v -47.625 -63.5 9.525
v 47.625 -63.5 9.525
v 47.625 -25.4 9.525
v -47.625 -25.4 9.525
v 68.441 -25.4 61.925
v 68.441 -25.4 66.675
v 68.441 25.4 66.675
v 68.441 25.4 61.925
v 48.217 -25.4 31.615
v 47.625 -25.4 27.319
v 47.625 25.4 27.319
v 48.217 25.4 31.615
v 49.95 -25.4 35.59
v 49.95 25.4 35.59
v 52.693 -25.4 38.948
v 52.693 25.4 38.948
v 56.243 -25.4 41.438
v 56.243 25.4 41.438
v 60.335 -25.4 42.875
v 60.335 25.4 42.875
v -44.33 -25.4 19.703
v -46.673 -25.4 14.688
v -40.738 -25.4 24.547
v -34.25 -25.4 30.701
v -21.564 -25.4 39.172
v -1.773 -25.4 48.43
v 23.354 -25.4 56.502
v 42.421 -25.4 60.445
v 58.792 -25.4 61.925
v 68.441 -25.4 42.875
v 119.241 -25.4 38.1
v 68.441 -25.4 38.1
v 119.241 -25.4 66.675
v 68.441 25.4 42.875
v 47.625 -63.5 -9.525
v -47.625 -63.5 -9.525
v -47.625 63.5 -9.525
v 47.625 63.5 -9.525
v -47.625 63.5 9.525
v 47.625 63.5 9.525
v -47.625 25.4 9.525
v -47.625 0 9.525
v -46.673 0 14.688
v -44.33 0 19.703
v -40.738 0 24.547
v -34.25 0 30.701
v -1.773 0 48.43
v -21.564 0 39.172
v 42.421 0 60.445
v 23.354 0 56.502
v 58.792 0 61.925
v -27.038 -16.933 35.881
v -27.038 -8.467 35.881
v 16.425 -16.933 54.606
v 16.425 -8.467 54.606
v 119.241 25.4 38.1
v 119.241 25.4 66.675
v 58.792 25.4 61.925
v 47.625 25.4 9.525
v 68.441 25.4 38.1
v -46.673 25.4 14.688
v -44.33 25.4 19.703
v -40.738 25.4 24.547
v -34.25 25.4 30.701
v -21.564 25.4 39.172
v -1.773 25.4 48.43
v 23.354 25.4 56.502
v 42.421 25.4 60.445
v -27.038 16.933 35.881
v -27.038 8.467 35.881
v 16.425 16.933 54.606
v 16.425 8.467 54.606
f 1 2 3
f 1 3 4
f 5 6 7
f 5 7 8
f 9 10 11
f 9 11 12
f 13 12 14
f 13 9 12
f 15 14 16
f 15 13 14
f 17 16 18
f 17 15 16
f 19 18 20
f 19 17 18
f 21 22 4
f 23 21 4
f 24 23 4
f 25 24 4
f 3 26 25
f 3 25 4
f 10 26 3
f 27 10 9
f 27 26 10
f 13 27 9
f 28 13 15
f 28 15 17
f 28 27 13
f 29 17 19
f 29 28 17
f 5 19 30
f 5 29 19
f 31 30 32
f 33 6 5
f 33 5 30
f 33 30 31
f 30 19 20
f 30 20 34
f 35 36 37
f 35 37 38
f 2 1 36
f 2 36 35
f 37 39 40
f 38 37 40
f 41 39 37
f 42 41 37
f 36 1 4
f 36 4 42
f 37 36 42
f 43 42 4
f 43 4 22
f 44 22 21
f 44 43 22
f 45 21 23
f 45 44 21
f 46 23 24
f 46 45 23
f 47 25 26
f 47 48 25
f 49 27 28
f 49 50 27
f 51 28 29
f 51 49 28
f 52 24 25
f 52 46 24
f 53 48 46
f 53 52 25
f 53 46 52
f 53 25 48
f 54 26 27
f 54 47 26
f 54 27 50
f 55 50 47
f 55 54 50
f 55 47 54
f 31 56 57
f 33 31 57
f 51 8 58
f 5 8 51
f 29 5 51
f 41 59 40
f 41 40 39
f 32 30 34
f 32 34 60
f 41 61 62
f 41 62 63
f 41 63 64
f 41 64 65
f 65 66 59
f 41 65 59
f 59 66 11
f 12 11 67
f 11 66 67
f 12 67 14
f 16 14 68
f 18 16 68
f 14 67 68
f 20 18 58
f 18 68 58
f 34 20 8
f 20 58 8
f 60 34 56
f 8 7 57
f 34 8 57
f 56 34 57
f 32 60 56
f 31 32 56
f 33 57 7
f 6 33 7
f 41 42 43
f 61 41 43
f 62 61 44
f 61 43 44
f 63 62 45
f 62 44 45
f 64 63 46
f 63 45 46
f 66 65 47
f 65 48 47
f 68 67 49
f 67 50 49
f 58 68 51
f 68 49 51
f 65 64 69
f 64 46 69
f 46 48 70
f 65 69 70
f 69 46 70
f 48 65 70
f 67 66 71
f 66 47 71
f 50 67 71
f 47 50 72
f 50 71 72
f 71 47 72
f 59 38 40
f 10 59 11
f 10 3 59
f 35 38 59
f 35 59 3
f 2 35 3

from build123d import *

# Parameters (mm, degrees)
F1_DEPTH = 63.5
F2_DEPTH = 25.4


with BuildPart() as f1:
    # F0 (on Front) → F1 (new body, symmetric)
    with BuildSketch(Plane.XZ):
        Polygon((-47.625, 9.525), (-47.625, -9.525), (47.625, -9.525), (47.625, 9.525), (28.575, 9.525), align=None)
    extrude(amount=F1_DEPTH, both=True)

    # F0 (on Front) → F2 (join, symmetric)
    with BuildSketch(Plane.XZ):
        Polygon((-47.625, 9.525), (-47.625, -9.525), (47.625, -9.525), (47.625, 9.525), (28.575, 9.525), align=None)
        with BuildLine():
            add(Edge.make_bspline(
                [(-47.625, 9.525), (-46.467692, 38.43854), (24.964292, 61.567295), (58.792322, 61.9252)],
                knots=[0, 0, 0, 0, 118.618833, 118.618833, 118.618833, 118.618833], degree=3))
            Line((-47.625, 9.525), (28.575, 9.525))
            Line((28.575, 9.525), (28.575, 27.318938))
            ThreePointArc((28.575, 27.318938), (37.19248, 50.290006), (58.792322, 61.9252))
        make_face()
        with BuildLine():
            Line((28.575, 9.525), (47.625, 9.525))
            Line((47.625, 9.525), (47.625, 27.318938))
            ThreePointArc((47.625, 27.318938), (51.20645, 37.363053), (60.334826, 42.8752))
            Line((60.334826, 42.8752), (68.441236, 42.8752))
            Line((68.441236, 42.8752), (68.441236, 61.9252))
            Line((68.441236, 61.9252), (58.792322, 61.9252))
            ThreePointArc((58.792322, 61.9252), (37.19248, 50.290006), (28.575, 27.318938))
            Line((28.575, 27.318938), (28.575, 9.525))
        make_face()
        Polygon((68.441236, 66.675), (68.441236, 61.9252), (68.441236, 42.8752), (68.441236, 38.1), (119.241236, 38.1), (119.241236, 66.675), align=None)
    extrude(amount=F2_DEPTH, both=True)


solid = f1.part
